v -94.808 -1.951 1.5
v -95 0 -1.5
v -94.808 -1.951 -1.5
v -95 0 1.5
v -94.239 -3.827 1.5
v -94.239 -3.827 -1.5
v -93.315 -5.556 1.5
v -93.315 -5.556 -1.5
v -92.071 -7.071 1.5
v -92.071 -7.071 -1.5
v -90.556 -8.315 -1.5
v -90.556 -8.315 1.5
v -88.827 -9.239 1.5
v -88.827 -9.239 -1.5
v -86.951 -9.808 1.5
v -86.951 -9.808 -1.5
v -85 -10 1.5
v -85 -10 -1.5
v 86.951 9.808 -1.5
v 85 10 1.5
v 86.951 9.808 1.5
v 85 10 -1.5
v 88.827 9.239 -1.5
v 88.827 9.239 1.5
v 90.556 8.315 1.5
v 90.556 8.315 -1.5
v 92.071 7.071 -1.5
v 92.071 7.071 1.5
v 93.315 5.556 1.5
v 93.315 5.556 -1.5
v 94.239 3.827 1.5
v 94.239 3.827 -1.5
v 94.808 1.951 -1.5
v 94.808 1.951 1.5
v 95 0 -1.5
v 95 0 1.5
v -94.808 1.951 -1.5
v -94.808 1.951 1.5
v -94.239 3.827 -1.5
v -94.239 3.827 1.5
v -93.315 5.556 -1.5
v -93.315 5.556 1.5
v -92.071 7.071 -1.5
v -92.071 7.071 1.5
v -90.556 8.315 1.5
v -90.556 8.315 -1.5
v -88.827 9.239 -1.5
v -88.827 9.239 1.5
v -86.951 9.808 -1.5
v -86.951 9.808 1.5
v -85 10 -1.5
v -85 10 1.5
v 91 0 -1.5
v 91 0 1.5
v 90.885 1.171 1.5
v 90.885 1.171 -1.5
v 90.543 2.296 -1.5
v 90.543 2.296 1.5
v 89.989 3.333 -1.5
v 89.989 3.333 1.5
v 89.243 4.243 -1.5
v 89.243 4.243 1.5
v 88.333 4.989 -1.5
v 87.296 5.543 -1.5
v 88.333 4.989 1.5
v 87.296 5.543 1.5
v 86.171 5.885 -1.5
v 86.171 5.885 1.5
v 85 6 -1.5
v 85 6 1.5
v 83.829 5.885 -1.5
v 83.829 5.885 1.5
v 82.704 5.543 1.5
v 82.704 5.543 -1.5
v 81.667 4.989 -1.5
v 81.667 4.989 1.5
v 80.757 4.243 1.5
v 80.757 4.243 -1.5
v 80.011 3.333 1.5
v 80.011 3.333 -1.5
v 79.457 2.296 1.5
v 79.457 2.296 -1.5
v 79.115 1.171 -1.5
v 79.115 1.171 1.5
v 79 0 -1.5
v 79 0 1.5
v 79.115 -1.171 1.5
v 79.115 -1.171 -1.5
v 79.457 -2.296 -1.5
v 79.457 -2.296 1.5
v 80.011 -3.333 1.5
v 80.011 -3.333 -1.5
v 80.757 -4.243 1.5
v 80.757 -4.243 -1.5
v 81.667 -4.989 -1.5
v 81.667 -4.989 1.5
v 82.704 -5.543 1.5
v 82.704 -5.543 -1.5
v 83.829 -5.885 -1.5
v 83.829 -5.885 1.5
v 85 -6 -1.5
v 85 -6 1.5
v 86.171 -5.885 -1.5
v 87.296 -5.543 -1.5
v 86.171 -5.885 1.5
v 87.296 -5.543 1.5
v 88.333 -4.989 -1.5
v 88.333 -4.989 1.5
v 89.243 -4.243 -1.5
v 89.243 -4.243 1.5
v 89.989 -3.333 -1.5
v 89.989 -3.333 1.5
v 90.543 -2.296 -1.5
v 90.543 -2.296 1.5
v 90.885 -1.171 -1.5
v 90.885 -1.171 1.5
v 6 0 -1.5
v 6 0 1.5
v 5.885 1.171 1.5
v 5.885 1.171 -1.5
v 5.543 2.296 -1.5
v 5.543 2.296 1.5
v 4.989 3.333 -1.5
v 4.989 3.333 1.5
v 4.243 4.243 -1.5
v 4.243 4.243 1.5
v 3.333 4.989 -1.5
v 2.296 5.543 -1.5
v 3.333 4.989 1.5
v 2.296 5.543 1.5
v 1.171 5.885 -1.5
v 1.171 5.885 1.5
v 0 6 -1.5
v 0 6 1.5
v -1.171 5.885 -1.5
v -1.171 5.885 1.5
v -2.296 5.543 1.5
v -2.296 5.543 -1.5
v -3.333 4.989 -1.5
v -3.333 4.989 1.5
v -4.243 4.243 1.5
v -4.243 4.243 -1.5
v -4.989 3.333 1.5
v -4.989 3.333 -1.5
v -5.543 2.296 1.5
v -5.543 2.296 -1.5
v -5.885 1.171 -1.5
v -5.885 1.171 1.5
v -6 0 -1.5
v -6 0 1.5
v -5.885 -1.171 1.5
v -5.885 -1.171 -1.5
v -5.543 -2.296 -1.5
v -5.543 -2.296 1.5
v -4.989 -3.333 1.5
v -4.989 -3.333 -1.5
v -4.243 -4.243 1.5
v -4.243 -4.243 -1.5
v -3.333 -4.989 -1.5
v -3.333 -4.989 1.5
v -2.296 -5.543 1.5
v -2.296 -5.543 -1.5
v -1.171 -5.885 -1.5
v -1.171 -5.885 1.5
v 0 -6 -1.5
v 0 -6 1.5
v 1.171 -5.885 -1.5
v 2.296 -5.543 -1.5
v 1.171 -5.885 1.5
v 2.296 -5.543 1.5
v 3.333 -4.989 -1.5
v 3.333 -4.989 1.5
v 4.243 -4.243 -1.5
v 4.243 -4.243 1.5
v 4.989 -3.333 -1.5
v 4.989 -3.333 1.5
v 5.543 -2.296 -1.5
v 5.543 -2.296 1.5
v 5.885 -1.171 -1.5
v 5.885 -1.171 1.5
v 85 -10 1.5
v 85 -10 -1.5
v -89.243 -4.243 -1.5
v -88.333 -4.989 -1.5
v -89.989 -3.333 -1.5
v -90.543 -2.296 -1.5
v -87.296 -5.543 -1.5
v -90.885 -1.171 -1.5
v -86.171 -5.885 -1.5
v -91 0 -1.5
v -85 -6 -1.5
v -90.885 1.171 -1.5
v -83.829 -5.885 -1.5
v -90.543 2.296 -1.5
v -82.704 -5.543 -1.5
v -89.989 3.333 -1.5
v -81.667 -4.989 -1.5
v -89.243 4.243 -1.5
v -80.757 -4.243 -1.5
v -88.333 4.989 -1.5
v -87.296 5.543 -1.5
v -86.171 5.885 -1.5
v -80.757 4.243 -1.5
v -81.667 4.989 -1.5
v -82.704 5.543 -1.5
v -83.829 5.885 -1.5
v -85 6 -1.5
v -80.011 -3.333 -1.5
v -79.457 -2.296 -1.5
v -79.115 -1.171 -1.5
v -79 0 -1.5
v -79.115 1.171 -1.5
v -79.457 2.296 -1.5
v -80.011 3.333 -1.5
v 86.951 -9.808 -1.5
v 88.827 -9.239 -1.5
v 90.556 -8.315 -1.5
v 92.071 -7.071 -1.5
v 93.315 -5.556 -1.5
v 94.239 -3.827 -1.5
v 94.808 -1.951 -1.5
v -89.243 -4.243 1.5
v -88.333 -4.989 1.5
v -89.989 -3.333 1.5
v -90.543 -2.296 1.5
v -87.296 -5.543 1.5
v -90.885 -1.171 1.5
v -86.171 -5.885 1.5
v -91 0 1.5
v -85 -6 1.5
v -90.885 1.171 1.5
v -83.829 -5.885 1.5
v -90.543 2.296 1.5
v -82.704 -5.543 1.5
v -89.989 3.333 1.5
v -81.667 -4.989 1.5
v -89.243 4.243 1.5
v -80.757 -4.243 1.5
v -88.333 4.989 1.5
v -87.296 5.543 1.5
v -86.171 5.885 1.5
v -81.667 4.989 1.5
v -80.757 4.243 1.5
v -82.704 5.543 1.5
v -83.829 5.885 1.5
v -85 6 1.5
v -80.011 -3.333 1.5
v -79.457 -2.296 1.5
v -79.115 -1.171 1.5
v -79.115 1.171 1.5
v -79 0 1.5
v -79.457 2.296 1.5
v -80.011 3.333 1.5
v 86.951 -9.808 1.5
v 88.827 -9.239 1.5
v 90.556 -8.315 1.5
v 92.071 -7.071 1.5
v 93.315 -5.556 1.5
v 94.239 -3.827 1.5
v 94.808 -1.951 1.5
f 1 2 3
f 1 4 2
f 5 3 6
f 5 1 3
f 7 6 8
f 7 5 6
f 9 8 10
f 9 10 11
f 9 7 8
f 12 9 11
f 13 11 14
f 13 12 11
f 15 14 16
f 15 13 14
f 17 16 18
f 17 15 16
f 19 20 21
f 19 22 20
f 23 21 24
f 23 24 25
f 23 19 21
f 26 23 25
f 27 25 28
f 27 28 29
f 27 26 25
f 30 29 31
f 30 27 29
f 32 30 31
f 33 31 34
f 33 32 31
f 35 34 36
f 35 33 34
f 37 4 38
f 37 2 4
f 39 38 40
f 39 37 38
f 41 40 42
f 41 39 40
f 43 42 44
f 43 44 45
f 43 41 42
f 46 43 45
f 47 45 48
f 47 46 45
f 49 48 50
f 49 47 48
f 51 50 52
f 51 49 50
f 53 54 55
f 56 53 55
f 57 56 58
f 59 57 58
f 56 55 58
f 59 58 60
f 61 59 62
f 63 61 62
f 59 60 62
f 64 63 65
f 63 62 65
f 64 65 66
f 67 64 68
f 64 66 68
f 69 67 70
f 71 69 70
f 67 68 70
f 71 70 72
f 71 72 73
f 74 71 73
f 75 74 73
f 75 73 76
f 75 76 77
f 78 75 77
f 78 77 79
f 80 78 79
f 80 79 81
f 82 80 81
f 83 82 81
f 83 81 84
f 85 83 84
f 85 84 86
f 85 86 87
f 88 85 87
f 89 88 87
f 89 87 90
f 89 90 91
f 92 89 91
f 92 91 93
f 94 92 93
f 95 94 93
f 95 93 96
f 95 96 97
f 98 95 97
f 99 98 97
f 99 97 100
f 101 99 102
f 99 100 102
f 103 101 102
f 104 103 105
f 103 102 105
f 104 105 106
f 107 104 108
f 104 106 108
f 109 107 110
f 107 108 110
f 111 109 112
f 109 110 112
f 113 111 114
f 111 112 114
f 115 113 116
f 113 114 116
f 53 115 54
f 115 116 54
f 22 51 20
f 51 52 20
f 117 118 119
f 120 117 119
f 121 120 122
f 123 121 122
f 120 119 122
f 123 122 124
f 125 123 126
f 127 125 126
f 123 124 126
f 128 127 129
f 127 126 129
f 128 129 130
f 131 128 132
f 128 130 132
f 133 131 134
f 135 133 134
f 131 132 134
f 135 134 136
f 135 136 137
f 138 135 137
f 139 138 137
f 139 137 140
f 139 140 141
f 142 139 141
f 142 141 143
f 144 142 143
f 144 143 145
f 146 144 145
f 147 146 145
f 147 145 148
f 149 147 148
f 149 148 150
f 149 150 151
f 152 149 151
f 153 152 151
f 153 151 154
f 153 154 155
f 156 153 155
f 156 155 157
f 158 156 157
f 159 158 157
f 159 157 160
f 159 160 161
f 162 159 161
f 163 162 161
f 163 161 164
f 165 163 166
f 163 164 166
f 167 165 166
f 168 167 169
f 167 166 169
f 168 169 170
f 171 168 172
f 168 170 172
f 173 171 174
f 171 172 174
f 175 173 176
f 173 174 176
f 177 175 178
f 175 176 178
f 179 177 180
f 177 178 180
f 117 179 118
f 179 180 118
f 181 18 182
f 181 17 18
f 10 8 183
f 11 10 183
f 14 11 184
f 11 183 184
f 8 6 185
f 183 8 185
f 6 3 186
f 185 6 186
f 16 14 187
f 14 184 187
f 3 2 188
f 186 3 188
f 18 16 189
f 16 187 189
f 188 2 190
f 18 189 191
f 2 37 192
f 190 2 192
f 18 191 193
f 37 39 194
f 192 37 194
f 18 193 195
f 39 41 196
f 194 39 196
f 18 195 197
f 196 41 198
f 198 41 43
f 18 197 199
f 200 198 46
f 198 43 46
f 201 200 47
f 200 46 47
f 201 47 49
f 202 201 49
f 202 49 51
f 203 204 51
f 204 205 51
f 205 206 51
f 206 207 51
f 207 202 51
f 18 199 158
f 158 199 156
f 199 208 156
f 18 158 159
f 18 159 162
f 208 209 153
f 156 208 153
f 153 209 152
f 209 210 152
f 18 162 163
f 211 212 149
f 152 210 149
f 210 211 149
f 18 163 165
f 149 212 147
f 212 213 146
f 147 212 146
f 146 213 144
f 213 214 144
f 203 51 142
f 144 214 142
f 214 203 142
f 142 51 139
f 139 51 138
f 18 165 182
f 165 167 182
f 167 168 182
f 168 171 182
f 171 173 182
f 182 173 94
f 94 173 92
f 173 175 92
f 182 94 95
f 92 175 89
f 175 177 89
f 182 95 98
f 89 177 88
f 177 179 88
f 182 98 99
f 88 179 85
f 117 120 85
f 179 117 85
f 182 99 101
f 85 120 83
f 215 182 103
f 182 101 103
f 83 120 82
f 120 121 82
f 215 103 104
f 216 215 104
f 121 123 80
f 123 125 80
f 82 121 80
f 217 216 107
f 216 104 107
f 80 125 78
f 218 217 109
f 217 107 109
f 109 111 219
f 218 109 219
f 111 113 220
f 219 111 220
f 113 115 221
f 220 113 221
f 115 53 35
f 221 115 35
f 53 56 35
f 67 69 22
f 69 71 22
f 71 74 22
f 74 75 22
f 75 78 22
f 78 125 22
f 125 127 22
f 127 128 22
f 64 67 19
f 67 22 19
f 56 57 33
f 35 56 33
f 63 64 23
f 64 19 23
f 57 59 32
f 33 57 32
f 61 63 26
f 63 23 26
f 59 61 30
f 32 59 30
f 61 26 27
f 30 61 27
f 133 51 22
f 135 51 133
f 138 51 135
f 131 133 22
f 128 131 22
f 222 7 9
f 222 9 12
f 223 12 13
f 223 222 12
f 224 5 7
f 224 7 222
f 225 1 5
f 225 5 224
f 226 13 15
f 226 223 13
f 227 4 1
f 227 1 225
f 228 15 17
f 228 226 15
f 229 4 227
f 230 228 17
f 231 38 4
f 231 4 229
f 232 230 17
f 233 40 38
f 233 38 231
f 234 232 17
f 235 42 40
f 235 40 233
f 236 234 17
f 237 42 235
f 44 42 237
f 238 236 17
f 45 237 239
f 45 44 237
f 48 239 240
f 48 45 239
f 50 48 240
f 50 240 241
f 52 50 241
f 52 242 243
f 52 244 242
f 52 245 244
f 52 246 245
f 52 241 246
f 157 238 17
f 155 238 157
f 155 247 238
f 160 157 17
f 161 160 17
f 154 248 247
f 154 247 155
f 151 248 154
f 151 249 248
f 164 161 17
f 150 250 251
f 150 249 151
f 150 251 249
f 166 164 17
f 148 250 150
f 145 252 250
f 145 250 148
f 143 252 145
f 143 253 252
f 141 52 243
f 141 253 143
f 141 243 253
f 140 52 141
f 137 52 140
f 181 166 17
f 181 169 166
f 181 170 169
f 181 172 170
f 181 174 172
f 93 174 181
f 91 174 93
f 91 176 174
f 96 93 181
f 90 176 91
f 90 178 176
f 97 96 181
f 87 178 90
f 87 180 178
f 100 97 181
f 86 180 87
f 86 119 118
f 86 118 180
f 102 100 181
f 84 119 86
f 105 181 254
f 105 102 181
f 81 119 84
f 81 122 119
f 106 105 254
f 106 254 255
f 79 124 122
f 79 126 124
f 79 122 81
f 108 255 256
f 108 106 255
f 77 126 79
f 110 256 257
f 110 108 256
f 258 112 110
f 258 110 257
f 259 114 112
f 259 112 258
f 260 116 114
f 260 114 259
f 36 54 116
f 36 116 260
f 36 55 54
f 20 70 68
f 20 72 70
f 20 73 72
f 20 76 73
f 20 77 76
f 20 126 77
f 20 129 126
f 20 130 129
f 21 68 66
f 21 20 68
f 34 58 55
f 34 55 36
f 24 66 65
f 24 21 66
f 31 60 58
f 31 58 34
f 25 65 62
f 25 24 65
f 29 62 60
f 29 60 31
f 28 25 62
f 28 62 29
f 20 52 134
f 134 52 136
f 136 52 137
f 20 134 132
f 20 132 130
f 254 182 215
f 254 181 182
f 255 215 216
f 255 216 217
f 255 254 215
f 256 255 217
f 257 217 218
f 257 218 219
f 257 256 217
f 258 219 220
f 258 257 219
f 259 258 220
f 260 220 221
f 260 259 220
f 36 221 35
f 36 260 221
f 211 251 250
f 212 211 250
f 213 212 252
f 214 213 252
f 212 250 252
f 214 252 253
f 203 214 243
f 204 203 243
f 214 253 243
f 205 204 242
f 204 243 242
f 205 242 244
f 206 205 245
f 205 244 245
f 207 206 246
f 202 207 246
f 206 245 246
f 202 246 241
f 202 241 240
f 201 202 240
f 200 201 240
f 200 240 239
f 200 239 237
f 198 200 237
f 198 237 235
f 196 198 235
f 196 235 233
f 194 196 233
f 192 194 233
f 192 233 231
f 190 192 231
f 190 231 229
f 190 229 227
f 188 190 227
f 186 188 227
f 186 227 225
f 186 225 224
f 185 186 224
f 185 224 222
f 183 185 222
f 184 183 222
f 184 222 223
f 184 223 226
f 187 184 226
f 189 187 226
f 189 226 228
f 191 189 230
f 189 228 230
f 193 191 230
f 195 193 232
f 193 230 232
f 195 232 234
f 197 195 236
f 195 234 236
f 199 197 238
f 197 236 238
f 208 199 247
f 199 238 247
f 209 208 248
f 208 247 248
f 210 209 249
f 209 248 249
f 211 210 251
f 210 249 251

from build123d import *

# Parameters (mm, degrees)
F0_W     = 190
F0_H     = 20
F1_DEPTH = 1.5
F2_R     = 6
F3_DEPTH = 3.001
F4_R     = 6
F5_DEPTH = 3.001
F6_R     = 9.99999


# Not quite as in the source:
# - a fillet or chamfer is up to 0.001 mm smaller than in the source, because OpenCascade refuses the exact size


with BuildPart() as f1:
    # F0 (on Top) → F1 (new body, symmetric)
    with BuildSketch(Plane.XY):
        Rectangle(F0_W, F0_H)
    extrude(amount=F1_DEPTH, both=True)

    # F2 (on face) → F3 (cut, through all)
    with BuildSketch(Plane.XY.offset(1.5)):
        with Locations((-85, 0)):
            Circle(F2_R)
        with Locations((85, 0)):
            Circle(F2_R)
    extrude(amount=-F3_DEPTH, mode=Mode.SUBTRACT)

    # F4 (on face) → F5 (cut, through all)
    with BuildSketch(Plane.XY.offset(1.5)):
        Circle(F4_R)
    extrude(amount=-F5_DEPTH, mode=Mode.SUBTRACT)

    # F6 (radius 10 in the source; OpenCascade refuses exactly that, so slightly less here)
    f6_edges = [f1.edges().sort_by_distance(p)[0] for p in [
        (-95, -10, 0),
        (-95, 10, 0),
        (95, -10, 0),
        (95, 10, 0),
    ]]
    fillet(f6_edges, radius=F6_R)


solid = f1.part
